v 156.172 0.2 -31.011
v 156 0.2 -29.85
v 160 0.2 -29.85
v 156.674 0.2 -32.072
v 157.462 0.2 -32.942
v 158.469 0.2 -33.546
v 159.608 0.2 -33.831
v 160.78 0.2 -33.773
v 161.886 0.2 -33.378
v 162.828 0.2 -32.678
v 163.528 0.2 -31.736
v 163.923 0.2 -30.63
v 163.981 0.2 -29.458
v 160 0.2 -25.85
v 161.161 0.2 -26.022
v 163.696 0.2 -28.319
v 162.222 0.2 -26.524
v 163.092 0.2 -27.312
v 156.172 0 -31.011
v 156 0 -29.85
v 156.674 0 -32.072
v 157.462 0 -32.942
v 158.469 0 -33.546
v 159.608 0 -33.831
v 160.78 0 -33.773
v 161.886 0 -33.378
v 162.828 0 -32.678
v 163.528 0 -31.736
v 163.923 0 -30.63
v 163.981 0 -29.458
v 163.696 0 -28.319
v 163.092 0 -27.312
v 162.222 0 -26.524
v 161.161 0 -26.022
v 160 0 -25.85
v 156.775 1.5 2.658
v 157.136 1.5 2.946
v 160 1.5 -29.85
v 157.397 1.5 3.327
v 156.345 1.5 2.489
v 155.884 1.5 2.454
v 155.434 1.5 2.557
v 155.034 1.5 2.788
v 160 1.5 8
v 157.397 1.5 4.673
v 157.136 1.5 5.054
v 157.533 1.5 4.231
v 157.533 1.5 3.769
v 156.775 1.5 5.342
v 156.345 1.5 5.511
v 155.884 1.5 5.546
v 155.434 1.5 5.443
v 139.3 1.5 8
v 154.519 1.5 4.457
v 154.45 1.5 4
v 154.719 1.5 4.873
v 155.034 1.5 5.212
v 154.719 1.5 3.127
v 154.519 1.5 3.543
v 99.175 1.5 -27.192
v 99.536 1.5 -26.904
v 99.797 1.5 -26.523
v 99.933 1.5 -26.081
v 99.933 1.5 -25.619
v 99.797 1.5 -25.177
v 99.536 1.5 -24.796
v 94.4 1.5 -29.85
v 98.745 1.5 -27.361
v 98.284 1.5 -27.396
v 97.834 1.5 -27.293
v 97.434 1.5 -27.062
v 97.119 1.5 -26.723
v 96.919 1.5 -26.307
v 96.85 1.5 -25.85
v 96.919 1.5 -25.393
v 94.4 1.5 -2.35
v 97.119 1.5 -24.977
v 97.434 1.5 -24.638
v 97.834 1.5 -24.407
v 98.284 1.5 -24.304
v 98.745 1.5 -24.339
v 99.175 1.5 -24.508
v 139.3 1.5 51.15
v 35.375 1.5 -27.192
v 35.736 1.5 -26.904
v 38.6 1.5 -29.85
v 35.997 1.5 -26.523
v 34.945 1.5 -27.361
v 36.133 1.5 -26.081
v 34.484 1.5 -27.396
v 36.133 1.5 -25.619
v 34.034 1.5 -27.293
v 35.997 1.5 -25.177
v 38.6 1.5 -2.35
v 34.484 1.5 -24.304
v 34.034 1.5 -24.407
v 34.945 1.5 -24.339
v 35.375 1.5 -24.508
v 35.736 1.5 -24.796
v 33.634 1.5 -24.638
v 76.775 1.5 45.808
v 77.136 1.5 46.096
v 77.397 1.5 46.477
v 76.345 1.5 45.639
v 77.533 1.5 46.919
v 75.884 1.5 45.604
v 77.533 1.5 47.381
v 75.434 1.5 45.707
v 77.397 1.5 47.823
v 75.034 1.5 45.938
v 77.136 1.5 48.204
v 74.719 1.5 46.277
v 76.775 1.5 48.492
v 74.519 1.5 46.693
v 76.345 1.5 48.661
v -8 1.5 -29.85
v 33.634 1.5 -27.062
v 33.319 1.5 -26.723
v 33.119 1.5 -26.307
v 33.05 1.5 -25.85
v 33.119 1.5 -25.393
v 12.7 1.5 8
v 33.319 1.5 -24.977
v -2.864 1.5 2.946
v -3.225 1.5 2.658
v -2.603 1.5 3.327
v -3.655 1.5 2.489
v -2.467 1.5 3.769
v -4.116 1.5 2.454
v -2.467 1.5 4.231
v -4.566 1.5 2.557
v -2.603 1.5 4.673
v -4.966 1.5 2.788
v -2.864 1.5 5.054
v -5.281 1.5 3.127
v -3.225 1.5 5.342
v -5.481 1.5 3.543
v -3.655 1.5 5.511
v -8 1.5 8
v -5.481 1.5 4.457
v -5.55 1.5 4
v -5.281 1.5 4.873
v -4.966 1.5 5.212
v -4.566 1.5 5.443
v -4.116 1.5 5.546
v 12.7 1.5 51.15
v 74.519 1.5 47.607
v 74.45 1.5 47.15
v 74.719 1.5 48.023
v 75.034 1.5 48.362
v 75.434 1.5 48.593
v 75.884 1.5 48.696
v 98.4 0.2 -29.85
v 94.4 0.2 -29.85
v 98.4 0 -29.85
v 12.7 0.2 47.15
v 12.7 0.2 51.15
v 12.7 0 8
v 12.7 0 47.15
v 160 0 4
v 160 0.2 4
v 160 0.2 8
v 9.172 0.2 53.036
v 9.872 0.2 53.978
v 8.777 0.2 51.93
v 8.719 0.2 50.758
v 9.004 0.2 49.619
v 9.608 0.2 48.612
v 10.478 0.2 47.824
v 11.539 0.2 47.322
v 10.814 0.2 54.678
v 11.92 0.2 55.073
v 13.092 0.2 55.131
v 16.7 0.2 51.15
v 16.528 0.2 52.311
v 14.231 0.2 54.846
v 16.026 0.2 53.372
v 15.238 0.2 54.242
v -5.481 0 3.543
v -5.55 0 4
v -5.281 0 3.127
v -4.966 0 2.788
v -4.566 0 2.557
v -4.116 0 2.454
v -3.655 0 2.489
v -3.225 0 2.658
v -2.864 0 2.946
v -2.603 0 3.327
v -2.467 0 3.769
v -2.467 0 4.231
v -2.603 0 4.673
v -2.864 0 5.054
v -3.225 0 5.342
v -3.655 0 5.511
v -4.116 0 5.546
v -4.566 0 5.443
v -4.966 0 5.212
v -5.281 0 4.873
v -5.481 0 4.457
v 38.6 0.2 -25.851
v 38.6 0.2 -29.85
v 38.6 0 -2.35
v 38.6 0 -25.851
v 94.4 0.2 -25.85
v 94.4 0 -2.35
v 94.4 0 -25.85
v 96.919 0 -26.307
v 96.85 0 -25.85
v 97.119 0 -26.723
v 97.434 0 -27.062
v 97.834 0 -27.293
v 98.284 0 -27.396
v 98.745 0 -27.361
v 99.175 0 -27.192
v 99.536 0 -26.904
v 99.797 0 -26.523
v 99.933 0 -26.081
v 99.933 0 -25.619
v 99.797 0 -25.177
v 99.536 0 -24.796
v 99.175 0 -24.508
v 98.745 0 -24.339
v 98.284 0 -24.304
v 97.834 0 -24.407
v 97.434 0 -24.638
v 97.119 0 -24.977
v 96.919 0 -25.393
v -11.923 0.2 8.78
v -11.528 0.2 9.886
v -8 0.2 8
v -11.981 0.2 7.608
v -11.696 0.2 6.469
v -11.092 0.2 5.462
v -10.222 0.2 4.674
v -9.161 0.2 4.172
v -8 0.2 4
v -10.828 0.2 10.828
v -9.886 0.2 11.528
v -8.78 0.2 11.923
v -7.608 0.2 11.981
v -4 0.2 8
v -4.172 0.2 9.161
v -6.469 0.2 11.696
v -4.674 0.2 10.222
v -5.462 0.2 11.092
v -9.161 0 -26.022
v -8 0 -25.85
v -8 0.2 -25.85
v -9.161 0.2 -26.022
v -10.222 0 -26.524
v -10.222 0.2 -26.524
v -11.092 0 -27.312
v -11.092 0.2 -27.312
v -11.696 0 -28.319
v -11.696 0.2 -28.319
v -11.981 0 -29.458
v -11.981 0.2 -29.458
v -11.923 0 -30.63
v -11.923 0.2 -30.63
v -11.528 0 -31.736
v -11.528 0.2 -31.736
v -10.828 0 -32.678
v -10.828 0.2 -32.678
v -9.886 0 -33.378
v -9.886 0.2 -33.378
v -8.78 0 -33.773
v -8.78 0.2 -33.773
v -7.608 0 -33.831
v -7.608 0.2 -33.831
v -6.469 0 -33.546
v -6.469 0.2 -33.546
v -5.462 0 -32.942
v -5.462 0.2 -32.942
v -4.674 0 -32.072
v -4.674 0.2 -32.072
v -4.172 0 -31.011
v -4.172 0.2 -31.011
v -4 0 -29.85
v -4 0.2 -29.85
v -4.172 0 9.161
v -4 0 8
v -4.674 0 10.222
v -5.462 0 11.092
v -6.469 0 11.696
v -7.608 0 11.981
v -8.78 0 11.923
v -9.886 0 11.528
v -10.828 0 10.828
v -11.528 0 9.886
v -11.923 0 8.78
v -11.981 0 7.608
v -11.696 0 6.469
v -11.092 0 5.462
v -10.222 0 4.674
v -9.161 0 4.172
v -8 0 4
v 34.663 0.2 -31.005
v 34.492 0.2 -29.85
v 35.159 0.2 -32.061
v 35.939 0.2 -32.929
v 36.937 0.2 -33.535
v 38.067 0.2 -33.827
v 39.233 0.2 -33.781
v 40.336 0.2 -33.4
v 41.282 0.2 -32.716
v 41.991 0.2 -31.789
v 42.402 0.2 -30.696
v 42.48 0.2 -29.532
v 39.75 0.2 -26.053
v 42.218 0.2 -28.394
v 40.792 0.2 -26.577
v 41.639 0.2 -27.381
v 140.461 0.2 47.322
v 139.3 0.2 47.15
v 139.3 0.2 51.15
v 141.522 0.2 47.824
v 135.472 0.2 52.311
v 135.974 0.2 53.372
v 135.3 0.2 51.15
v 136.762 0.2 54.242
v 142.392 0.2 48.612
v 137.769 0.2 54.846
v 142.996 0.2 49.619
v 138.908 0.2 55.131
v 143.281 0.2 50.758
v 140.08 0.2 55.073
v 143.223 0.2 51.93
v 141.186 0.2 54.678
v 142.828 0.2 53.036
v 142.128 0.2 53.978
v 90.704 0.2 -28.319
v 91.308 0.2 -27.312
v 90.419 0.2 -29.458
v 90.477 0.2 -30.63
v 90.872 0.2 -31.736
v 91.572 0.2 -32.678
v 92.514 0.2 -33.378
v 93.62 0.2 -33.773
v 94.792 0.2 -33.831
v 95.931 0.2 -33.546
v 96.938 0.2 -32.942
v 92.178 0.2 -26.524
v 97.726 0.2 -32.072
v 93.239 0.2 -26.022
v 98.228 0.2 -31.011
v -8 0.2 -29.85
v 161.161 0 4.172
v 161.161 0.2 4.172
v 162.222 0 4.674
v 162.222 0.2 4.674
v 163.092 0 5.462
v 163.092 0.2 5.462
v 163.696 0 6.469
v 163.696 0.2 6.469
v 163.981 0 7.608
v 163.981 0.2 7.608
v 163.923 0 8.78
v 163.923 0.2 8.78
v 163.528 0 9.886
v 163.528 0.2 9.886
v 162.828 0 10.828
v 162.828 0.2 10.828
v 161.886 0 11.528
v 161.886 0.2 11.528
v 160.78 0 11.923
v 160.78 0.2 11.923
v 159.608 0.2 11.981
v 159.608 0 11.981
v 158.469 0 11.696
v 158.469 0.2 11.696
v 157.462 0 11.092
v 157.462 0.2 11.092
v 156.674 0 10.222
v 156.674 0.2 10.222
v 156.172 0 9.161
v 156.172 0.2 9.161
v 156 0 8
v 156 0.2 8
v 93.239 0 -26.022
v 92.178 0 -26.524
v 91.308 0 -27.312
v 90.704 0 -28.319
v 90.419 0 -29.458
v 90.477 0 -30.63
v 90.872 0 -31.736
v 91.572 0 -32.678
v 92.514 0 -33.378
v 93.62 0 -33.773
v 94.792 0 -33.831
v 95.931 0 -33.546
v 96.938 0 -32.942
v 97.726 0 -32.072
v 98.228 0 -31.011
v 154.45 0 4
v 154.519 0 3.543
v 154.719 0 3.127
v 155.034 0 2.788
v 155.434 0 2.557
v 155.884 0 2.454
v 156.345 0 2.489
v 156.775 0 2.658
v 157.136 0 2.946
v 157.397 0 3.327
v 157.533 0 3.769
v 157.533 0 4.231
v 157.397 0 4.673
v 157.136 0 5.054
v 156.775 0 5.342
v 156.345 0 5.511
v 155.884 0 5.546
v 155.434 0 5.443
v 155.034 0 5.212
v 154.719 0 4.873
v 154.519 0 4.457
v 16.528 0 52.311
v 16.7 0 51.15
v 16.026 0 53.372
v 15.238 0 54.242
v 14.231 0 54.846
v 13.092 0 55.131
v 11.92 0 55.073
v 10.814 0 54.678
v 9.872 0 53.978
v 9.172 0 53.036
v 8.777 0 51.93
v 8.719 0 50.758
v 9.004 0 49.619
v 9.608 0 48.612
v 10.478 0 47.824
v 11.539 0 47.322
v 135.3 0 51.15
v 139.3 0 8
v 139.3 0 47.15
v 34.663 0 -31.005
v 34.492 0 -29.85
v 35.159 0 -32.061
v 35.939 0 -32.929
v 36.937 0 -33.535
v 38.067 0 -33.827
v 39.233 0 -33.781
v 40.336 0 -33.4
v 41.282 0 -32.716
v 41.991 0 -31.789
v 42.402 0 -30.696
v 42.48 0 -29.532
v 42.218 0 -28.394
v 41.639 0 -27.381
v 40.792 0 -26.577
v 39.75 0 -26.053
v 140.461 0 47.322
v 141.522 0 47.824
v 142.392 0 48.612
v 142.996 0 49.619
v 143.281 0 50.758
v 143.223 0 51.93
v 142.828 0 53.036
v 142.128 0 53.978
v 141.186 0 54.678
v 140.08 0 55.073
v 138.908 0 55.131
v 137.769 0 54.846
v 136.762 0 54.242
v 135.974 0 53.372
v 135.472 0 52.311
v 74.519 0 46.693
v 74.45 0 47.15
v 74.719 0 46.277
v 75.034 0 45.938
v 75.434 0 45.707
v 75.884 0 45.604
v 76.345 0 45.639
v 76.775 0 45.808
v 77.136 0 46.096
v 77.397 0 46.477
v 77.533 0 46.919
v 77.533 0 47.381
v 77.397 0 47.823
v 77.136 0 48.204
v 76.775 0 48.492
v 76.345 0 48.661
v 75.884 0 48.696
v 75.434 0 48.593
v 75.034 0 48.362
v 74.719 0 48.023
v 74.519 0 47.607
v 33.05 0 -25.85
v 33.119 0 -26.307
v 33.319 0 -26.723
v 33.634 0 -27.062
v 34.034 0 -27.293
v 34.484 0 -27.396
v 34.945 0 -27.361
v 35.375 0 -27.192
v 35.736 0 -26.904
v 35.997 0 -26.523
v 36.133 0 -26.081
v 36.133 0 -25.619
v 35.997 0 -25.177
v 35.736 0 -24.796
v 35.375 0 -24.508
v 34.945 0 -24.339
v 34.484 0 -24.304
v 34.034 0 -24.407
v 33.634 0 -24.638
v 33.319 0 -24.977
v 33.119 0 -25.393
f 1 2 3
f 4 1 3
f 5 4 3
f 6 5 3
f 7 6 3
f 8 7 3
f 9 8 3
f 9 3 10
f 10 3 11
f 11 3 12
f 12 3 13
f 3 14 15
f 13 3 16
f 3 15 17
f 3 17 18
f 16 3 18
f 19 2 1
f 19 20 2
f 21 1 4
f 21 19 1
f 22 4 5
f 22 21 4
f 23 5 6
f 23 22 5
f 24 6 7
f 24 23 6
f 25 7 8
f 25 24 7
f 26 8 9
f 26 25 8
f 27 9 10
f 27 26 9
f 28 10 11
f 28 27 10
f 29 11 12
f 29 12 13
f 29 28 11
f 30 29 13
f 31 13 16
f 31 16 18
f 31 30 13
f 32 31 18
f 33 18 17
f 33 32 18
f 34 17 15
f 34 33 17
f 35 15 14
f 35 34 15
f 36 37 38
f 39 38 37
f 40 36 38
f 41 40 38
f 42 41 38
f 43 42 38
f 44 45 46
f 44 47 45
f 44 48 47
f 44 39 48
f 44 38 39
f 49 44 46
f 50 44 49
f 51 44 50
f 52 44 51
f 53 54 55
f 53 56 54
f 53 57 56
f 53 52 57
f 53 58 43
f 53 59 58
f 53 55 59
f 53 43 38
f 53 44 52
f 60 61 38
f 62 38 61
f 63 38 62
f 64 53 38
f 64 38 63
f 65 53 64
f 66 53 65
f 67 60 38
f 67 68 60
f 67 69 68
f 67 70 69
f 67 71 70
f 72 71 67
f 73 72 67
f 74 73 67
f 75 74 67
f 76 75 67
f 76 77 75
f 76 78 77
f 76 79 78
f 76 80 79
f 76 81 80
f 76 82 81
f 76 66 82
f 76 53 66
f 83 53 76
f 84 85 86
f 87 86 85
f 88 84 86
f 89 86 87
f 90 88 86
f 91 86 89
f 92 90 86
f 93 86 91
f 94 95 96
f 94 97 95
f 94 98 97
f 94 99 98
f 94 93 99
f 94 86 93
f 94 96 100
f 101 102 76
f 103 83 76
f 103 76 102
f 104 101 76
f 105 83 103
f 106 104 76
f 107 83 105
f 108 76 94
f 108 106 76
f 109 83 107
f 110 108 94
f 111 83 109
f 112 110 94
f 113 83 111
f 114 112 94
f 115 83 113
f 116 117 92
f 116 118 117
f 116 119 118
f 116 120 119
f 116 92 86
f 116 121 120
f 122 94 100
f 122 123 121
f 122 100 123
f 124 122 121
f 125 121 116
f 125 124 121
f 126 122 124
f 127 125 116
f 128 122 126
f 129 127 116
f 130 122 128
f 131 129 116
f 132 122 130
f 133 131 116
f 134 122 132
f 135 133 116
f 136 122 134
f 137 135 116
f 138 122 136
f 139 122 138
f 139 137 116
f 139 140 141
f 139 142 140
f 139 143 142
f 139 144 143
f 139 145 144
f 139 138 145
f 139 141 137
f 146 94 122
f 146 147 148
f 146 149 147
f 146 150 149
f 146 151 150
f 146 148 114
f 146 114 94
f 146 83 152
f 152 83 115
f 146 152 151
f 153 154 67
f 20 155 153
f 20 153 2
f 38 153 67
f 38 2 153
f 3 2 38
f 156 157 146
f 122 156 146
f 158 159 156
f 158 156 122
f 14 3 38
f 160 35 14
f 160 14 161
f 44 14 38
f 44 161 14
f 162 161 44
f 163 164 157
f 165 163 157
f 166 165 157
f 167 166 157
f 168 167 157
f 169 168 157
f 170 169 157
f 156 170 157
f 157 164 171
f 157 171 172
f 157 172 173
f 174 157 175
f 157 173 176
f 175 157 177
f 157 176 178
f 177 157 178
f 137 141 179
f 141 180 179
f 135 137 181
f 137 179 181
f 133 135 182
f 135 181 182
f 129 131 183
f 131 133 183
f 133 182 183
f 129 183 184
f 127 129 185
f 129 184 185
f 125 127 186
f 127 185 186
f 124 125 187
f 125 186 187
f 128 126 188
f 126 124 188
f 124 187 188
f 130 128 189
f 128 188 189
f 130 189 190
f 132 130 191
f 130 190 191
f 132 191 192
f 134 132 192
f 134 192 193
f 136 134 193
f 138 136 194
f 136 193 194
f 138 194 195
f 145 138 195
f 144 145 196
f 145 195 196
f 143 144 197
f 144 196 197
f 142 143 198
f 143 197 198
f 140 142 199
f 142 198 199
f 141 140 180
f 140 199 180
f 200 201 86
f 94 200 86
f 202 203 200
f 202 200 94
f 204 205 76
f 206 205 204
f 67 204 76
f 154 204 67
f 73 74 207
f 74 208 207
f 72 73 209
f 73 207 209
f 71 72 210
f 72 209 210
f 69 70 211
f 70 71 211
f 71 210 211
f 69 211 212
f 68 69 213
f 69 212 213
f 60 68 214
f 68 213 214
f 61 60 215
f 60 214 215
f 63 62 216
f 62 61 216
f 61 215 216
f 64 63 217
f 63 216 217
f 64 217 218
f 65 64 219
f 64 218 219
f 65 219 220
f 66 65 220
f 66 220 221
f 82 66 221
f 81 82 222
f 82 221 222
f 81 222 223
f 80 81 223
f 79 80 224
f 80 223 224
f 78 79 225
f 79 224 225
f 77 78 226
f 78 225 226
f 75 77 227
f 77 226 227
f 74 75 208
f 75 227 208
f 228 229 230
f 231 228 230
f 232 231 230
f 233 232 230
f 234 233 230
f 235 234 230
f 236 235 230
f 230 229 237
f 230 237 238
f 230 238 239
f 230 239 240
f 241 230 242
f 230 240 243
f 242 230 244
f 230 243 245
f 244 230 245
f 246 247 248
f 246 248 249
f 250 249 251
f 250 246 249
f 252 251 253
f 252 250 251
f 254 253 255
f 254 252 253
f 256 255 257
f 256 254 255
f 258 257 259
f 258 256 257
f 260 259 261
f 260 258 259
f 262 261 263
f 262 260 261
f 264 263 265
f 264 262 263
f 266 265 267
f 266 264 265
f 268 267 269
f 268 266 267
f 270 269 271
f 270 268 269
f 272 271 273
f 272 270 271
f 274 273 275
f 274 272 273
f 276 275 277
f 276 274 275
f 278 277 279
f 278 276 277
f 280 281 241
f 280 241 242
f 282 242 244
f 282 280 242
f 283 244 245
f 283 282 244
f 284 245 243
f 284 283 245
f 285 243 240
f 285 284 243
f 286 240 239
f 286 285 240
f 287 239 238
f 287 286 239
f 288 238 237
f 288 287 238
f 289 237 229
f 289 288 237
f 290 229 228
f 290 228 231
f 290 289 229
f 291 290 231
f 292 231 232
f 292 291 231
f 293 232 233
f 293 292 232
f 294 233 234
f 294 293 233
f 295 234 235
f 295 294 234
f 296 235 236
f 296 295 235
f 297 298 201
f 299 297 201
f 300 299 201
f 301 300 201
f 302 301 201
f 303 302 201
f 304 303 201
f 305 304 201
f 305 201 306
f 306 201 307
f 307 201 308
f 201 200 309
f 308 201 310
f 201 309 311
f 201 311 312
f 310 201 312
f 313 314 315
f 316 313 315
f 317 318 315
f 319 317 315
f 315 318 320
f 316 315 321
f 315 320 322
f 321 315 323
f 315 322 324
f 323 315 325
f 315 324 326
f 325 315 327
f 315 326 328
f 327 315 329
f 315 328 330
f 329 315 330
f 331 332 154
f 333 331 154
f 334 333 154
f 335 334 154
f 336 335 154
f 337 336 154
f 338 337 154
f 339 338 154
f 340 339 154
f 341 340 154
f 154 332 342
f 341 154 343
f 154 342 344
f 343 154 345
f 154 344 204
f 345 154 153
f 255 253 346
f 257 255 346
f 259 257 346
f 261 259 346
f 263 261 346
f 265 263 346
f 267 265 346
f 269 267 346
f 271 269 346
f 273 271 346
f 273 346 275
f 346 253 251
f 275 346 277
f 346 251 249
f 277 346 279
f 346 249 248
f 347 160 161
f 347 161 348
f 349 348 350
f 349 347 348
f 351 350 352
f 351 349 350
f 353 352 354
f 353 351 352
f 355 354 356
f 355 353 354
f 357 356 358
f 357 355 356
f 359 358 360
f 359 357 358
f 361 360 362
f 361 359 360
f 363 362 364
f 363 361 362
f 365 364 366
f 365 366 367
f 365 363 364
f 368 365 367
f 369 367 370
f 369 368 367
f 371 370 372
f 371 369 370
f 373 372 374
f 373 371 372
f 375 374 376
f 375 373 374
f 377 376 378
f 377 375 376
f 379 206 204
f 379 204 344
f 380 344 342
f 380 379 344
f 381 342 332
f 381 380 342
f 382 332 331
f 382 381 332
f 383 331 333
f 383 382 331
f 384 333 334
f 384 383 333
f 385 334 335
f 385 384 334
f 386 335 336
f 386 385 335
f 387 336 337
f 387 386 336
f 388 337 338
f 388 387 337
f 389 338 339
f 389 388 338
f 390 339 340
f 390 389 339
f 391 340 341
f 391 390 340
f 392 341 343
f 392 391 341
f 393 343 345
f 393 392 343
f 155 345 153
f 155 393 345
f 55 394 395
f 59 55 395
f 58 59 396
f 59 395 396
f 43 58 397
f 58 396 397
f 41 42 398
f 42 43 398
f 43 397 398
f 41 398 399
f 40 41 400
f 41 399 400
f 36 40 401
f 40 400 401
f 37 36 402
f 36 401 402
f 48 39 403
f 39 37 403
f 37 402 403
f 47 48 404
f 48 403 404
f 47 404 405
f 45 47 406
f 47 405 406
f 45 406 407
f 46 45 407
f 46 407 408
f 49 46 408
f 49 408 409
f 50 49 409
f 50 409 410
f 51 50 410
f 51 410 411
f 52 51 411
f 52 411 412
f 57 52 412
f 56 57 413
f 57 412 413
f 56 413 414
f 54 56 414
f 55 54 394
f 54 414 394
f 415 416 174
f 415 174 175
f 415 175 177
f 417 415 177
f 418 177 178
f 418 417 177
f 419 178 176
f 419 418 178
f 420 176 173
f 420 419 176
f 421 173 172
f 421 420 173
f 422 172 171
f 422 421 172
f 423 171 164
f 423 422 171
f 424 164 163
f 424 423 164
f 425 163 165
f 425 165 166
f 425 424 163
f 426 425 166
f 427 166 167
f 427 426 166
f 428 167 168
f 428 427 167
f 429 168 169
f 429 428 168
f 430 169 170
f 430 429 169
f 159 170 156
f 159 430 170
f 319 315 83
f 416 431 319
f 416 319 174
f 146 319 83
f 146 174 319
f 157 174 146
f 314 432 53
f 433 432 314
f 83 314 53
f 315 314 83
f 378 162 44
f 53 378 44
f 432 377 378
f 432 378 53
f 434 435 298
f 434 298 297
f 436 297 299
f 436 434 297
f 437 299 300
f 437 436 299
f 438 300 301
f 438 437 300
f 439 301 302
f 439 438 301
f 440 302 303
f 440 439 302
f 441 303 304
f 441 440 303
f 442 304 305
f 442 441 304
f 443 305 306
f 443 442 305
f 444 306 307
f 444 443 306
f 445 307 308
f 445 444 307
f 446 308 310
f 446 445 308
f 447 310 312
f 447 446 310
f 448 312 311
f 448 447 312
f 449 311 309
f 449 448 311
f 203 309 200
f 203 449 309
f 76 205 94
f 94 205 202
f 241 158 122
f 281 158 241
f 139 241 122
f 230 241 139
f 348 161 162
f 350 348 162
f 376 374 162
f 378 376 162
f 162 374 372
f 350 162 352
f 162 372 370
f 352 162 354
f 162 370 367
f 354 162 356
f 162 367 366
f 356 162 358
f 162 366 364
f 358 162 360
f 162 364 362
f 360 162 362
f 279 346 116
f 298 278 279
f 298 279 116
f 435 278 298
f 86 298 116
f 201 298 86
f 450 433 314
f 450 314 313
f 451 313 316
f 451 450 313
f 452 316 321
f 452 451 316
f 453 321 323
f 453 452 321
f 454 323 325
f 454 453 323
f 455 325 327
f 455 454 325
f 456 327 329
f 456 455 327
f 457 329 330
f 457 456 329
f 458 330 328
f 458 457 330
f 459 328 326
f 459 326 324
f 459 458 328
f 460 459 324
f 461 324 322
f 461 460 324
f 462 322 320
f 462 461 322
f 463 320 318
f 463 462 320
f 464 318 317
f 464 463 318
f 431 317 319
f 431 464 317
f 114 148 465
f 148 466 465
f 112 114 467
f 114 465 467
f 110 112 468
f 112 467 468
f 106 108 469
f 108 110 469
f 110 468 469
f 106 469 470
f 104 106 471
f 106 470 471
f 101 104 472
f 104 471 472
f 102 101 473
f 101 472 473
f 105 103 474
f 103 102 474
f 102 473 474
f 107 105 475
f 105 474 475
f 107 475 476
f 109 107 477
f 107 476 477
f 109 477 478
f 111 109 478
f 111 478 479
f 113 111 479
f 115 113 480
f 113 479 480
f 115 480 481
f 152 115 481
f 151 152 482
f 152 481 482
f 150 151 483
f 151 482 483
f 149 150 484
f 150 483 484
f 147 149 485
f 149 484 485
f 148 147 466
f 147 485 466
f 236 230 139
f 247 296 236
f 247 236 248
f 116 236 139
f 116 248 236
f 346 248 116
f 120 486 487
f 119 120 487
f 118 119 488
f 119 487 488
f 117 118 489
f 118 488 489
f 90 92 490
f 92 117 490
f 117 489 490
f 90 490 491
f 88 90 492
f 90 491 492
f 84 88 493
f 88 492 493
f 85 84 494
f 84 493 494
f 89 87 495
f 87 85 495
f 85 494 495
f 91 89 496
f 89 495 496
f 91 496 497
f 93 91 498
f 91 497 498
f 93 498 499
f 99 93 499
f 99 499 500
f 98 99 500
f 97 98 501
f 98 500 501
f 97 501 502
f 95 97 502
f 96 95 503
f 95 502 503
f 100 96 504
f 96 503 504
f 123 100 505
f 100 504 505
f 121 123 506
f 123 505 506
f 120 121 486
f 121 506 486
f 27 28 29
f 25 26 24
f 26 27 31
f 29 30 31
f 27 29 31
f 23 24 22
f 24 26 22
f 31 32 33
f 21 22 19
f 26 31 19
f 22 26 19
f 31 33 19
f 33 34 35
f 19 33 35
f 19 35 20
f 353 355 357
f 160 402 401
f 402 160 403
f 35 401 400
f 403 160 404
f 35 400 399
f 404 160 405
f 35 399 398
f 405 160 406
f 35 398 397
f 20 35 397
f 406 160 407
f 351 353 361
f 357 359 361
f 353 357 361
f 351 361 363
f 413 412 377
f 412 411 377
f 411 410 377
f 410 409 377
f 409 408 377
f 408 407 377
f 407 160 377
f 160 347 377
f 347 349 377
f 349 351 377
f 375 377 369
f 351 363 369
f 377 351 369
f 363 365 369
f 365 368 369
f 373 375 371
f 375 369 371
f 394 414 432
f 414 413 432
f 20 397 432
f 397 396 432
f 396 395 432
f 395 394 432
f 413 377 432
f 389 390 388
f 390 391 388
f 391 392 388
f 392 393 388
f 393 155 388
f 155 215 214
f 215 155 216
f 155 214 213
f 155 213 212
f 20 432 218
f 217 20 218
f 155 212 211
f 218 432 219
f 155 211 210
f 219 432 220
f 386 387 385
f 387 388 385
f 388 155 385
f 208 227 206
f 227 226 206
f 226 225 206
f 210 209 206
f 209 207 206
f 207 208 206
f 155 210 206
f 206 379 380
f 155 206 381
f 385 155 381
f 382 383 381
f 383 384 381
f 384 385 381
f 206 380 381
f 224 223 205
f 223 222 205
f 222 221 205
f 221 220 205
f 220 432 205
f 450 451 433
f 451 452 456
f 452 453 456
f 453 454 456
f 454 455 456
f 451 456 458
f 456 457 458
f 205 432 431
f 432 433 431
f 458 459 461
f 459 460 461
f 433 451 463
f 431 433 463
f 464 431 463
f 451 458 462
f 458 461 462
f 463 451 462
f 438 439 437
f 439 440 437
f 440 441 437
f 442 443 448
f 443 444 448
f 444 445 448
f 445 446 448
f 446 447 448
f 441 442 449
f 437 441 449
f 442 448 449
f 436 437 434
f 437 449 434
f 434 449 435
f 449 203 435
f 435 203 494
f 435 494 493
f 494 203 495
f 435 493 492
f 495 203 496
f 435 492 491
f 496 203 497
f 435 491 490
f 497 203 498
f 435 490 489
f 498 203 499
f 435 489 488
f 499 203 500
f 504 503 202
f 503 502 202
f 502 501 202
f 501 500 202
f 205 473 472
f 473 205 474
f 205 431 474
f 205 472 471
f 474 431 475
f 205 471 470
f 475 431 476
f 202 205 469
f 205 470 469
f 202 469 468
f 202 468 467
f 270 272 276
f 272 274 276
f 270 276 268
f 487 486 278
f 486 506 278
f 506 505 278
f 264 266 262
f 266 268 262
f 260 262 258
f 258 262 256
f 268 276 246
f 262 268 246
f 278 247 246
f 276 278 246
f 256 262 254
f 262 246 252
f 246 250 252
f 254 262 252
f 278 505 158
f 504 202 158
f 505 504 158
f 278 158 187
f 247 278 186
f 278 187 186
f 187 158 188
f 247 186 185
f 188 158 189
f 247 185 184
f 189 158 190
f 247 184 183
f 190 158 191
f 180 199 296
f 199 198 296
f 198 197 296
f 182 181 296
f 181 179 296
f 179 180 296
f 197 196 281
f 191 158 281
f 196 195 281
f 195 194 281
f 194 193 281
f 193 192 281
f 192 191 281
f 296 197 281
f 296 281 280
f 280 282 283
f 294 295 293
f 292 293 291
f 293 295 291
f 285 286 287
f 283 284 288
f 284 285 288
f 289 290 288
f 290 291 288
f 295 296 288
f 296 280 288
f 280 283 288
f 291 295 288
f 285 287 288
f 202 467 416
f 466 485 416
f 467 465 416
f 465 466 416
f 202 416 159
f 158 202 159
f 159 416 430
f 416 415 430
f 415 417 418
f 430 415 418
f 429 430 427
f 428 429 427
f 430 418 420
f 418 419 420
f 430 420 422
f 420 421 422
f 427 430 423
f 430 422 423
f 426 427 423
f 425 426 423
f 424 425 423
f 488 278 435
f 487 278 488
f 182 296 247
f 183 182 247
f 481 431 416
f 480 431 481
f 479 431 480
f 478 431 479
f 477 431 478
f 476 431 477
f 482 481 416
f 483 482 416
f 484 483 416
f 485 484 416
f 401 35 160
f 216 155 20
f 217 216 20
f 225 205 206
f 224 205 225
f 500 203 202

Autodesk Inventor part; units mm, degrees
ref_plane "YZ Plane" through (0, 0, 0) normal (1, 0, 0) x (0, 1, 0)
ref_plane "XZ Plane" through (0, 0, 0) normal (0, 1, 0) x (-1, 0, 0)
ref_plane "XY Plane" through (0, 0, 0) normal (0, 0, 1) x (1, 0, 0)
sketch "Sketch1" plane through (0, 0, 0) normal (0, 1, 0) x (-1, 0, 0)
  line L0 (-12.7, 8) -> (8, 8) projected
  line L1 (8, 8) -> (-12.7, 8)
  line L2 (8, 8) -> (8, -29.85) projected
  line L3 (8, 8) -> (8, -29.85)
  line L4 (-38.6, -29.85) -> (-38.6, -21.85) projected
  line L5 (8, -29.85) -> (-38.6, -29.85)
  line L6 (-38.6, -2.35) -> (-38.6, -21.85) projected
  line L7 (-38.6, -29.85) -> (-38.6, -2.35)
  line L8 (-94.4, -2.35) -> (-38.6, -2.35) projected
  line L9 (-38.6, -2.35) -> (-94.4, -2.35)
  line L10 (-94.4, -21.85) -> (-94.4, -29.85) projected
  line L11 (-94.4, -2.35) -> (-94.4, -29.85)
  line L12 (-94.4, -29.85) -> (-160, -29.85) projected
  line L13 (-94.4, -29.85) -> (-160, -29.85)
  line L14 (-160, -29.85) -> (-160, 8) projected
  line L15 (-160, -29.85) -> (-160, 8)
  line L16 (-139.3, 8) -> (-139.3, 51.15) projected
  line L17 (-160, 8) -> (-139.3, 8)
  line L18 (-139.3, 8) -> (-139.3, 51.15)
  line L19 (-139.3, 51.15) -> (-12.7, 51.15) projected
  line L20 (-139.3, 51.15) -> (-12.7, 51.15)
  line L21 (-12.7, 51.15) -> (-12.7, 8) projected
  line L22 (-12.7, 51.15) -> (-12.7, 8)
  circle A0 centre (-34.6, -25.85) radius 1.875 projected
  circle A1 centre (-34.6, -25.85) radius 1.55
  circle A2 centre (4, 4) radius 1.55
  circle A3 centre (-76, 47.15) radius 1.55
  circle A4 centre (-156, 4) radius 1.55
  circle A5 centre (-98.4, -25.85) radius 1.55
  point P0 (0, 0)
  dimension "d2" = 3.1
extrude "Extrusion1" add sketch "Sketch1" along normal blind 1.5 contours L0 L2 L5 L4 L6 L8 L11 L10 L12 L14 L17 L16 L19 L21 | A0
sketch "Sketch2" plane through (0, 0, 0) normal (0, -1, 0) x (1, 0, 0)
  line L0 (12.7, 8) -> (12.7, 51.15) projected
  circle A0 centre (12.7, 51.15) radius 4
  line L1 (12.7, 51.15) -> (139.3, 51.15) projected
  circle A1 centre (139.3, 51.15) radius 4
  line L2 (160, 8) -> (160, -29.85) projected
  circle A2 centre (160, 8) radius 4
  circle A3 centre (160, -29.85) radius 4
  circle A4 centre (94.4, -29.85) radius 4
  circle A5 centre (38.4923, -29.85) radius 4
  line L3 (38.6, -29.85) -> (-8, -29.85) projected
  circle A6 centre (-8, -29.85) radius 4
  circle A7 centre (-8, 8) radius 4
  point P0 (0, 0)
  dimension "d7" = 8
  dimension "d8" = 8
  dimension "d9" = 8
  dimension "d10" = 8
  dimension "d11" = 8
  dimension "d12" = 8
  dimension "d13" = 8
  dimension "d14" = 8
extrude "Extrusion2" add sketch "Sketch2" against normal blind 0.2
properties part number "TopPlate"
